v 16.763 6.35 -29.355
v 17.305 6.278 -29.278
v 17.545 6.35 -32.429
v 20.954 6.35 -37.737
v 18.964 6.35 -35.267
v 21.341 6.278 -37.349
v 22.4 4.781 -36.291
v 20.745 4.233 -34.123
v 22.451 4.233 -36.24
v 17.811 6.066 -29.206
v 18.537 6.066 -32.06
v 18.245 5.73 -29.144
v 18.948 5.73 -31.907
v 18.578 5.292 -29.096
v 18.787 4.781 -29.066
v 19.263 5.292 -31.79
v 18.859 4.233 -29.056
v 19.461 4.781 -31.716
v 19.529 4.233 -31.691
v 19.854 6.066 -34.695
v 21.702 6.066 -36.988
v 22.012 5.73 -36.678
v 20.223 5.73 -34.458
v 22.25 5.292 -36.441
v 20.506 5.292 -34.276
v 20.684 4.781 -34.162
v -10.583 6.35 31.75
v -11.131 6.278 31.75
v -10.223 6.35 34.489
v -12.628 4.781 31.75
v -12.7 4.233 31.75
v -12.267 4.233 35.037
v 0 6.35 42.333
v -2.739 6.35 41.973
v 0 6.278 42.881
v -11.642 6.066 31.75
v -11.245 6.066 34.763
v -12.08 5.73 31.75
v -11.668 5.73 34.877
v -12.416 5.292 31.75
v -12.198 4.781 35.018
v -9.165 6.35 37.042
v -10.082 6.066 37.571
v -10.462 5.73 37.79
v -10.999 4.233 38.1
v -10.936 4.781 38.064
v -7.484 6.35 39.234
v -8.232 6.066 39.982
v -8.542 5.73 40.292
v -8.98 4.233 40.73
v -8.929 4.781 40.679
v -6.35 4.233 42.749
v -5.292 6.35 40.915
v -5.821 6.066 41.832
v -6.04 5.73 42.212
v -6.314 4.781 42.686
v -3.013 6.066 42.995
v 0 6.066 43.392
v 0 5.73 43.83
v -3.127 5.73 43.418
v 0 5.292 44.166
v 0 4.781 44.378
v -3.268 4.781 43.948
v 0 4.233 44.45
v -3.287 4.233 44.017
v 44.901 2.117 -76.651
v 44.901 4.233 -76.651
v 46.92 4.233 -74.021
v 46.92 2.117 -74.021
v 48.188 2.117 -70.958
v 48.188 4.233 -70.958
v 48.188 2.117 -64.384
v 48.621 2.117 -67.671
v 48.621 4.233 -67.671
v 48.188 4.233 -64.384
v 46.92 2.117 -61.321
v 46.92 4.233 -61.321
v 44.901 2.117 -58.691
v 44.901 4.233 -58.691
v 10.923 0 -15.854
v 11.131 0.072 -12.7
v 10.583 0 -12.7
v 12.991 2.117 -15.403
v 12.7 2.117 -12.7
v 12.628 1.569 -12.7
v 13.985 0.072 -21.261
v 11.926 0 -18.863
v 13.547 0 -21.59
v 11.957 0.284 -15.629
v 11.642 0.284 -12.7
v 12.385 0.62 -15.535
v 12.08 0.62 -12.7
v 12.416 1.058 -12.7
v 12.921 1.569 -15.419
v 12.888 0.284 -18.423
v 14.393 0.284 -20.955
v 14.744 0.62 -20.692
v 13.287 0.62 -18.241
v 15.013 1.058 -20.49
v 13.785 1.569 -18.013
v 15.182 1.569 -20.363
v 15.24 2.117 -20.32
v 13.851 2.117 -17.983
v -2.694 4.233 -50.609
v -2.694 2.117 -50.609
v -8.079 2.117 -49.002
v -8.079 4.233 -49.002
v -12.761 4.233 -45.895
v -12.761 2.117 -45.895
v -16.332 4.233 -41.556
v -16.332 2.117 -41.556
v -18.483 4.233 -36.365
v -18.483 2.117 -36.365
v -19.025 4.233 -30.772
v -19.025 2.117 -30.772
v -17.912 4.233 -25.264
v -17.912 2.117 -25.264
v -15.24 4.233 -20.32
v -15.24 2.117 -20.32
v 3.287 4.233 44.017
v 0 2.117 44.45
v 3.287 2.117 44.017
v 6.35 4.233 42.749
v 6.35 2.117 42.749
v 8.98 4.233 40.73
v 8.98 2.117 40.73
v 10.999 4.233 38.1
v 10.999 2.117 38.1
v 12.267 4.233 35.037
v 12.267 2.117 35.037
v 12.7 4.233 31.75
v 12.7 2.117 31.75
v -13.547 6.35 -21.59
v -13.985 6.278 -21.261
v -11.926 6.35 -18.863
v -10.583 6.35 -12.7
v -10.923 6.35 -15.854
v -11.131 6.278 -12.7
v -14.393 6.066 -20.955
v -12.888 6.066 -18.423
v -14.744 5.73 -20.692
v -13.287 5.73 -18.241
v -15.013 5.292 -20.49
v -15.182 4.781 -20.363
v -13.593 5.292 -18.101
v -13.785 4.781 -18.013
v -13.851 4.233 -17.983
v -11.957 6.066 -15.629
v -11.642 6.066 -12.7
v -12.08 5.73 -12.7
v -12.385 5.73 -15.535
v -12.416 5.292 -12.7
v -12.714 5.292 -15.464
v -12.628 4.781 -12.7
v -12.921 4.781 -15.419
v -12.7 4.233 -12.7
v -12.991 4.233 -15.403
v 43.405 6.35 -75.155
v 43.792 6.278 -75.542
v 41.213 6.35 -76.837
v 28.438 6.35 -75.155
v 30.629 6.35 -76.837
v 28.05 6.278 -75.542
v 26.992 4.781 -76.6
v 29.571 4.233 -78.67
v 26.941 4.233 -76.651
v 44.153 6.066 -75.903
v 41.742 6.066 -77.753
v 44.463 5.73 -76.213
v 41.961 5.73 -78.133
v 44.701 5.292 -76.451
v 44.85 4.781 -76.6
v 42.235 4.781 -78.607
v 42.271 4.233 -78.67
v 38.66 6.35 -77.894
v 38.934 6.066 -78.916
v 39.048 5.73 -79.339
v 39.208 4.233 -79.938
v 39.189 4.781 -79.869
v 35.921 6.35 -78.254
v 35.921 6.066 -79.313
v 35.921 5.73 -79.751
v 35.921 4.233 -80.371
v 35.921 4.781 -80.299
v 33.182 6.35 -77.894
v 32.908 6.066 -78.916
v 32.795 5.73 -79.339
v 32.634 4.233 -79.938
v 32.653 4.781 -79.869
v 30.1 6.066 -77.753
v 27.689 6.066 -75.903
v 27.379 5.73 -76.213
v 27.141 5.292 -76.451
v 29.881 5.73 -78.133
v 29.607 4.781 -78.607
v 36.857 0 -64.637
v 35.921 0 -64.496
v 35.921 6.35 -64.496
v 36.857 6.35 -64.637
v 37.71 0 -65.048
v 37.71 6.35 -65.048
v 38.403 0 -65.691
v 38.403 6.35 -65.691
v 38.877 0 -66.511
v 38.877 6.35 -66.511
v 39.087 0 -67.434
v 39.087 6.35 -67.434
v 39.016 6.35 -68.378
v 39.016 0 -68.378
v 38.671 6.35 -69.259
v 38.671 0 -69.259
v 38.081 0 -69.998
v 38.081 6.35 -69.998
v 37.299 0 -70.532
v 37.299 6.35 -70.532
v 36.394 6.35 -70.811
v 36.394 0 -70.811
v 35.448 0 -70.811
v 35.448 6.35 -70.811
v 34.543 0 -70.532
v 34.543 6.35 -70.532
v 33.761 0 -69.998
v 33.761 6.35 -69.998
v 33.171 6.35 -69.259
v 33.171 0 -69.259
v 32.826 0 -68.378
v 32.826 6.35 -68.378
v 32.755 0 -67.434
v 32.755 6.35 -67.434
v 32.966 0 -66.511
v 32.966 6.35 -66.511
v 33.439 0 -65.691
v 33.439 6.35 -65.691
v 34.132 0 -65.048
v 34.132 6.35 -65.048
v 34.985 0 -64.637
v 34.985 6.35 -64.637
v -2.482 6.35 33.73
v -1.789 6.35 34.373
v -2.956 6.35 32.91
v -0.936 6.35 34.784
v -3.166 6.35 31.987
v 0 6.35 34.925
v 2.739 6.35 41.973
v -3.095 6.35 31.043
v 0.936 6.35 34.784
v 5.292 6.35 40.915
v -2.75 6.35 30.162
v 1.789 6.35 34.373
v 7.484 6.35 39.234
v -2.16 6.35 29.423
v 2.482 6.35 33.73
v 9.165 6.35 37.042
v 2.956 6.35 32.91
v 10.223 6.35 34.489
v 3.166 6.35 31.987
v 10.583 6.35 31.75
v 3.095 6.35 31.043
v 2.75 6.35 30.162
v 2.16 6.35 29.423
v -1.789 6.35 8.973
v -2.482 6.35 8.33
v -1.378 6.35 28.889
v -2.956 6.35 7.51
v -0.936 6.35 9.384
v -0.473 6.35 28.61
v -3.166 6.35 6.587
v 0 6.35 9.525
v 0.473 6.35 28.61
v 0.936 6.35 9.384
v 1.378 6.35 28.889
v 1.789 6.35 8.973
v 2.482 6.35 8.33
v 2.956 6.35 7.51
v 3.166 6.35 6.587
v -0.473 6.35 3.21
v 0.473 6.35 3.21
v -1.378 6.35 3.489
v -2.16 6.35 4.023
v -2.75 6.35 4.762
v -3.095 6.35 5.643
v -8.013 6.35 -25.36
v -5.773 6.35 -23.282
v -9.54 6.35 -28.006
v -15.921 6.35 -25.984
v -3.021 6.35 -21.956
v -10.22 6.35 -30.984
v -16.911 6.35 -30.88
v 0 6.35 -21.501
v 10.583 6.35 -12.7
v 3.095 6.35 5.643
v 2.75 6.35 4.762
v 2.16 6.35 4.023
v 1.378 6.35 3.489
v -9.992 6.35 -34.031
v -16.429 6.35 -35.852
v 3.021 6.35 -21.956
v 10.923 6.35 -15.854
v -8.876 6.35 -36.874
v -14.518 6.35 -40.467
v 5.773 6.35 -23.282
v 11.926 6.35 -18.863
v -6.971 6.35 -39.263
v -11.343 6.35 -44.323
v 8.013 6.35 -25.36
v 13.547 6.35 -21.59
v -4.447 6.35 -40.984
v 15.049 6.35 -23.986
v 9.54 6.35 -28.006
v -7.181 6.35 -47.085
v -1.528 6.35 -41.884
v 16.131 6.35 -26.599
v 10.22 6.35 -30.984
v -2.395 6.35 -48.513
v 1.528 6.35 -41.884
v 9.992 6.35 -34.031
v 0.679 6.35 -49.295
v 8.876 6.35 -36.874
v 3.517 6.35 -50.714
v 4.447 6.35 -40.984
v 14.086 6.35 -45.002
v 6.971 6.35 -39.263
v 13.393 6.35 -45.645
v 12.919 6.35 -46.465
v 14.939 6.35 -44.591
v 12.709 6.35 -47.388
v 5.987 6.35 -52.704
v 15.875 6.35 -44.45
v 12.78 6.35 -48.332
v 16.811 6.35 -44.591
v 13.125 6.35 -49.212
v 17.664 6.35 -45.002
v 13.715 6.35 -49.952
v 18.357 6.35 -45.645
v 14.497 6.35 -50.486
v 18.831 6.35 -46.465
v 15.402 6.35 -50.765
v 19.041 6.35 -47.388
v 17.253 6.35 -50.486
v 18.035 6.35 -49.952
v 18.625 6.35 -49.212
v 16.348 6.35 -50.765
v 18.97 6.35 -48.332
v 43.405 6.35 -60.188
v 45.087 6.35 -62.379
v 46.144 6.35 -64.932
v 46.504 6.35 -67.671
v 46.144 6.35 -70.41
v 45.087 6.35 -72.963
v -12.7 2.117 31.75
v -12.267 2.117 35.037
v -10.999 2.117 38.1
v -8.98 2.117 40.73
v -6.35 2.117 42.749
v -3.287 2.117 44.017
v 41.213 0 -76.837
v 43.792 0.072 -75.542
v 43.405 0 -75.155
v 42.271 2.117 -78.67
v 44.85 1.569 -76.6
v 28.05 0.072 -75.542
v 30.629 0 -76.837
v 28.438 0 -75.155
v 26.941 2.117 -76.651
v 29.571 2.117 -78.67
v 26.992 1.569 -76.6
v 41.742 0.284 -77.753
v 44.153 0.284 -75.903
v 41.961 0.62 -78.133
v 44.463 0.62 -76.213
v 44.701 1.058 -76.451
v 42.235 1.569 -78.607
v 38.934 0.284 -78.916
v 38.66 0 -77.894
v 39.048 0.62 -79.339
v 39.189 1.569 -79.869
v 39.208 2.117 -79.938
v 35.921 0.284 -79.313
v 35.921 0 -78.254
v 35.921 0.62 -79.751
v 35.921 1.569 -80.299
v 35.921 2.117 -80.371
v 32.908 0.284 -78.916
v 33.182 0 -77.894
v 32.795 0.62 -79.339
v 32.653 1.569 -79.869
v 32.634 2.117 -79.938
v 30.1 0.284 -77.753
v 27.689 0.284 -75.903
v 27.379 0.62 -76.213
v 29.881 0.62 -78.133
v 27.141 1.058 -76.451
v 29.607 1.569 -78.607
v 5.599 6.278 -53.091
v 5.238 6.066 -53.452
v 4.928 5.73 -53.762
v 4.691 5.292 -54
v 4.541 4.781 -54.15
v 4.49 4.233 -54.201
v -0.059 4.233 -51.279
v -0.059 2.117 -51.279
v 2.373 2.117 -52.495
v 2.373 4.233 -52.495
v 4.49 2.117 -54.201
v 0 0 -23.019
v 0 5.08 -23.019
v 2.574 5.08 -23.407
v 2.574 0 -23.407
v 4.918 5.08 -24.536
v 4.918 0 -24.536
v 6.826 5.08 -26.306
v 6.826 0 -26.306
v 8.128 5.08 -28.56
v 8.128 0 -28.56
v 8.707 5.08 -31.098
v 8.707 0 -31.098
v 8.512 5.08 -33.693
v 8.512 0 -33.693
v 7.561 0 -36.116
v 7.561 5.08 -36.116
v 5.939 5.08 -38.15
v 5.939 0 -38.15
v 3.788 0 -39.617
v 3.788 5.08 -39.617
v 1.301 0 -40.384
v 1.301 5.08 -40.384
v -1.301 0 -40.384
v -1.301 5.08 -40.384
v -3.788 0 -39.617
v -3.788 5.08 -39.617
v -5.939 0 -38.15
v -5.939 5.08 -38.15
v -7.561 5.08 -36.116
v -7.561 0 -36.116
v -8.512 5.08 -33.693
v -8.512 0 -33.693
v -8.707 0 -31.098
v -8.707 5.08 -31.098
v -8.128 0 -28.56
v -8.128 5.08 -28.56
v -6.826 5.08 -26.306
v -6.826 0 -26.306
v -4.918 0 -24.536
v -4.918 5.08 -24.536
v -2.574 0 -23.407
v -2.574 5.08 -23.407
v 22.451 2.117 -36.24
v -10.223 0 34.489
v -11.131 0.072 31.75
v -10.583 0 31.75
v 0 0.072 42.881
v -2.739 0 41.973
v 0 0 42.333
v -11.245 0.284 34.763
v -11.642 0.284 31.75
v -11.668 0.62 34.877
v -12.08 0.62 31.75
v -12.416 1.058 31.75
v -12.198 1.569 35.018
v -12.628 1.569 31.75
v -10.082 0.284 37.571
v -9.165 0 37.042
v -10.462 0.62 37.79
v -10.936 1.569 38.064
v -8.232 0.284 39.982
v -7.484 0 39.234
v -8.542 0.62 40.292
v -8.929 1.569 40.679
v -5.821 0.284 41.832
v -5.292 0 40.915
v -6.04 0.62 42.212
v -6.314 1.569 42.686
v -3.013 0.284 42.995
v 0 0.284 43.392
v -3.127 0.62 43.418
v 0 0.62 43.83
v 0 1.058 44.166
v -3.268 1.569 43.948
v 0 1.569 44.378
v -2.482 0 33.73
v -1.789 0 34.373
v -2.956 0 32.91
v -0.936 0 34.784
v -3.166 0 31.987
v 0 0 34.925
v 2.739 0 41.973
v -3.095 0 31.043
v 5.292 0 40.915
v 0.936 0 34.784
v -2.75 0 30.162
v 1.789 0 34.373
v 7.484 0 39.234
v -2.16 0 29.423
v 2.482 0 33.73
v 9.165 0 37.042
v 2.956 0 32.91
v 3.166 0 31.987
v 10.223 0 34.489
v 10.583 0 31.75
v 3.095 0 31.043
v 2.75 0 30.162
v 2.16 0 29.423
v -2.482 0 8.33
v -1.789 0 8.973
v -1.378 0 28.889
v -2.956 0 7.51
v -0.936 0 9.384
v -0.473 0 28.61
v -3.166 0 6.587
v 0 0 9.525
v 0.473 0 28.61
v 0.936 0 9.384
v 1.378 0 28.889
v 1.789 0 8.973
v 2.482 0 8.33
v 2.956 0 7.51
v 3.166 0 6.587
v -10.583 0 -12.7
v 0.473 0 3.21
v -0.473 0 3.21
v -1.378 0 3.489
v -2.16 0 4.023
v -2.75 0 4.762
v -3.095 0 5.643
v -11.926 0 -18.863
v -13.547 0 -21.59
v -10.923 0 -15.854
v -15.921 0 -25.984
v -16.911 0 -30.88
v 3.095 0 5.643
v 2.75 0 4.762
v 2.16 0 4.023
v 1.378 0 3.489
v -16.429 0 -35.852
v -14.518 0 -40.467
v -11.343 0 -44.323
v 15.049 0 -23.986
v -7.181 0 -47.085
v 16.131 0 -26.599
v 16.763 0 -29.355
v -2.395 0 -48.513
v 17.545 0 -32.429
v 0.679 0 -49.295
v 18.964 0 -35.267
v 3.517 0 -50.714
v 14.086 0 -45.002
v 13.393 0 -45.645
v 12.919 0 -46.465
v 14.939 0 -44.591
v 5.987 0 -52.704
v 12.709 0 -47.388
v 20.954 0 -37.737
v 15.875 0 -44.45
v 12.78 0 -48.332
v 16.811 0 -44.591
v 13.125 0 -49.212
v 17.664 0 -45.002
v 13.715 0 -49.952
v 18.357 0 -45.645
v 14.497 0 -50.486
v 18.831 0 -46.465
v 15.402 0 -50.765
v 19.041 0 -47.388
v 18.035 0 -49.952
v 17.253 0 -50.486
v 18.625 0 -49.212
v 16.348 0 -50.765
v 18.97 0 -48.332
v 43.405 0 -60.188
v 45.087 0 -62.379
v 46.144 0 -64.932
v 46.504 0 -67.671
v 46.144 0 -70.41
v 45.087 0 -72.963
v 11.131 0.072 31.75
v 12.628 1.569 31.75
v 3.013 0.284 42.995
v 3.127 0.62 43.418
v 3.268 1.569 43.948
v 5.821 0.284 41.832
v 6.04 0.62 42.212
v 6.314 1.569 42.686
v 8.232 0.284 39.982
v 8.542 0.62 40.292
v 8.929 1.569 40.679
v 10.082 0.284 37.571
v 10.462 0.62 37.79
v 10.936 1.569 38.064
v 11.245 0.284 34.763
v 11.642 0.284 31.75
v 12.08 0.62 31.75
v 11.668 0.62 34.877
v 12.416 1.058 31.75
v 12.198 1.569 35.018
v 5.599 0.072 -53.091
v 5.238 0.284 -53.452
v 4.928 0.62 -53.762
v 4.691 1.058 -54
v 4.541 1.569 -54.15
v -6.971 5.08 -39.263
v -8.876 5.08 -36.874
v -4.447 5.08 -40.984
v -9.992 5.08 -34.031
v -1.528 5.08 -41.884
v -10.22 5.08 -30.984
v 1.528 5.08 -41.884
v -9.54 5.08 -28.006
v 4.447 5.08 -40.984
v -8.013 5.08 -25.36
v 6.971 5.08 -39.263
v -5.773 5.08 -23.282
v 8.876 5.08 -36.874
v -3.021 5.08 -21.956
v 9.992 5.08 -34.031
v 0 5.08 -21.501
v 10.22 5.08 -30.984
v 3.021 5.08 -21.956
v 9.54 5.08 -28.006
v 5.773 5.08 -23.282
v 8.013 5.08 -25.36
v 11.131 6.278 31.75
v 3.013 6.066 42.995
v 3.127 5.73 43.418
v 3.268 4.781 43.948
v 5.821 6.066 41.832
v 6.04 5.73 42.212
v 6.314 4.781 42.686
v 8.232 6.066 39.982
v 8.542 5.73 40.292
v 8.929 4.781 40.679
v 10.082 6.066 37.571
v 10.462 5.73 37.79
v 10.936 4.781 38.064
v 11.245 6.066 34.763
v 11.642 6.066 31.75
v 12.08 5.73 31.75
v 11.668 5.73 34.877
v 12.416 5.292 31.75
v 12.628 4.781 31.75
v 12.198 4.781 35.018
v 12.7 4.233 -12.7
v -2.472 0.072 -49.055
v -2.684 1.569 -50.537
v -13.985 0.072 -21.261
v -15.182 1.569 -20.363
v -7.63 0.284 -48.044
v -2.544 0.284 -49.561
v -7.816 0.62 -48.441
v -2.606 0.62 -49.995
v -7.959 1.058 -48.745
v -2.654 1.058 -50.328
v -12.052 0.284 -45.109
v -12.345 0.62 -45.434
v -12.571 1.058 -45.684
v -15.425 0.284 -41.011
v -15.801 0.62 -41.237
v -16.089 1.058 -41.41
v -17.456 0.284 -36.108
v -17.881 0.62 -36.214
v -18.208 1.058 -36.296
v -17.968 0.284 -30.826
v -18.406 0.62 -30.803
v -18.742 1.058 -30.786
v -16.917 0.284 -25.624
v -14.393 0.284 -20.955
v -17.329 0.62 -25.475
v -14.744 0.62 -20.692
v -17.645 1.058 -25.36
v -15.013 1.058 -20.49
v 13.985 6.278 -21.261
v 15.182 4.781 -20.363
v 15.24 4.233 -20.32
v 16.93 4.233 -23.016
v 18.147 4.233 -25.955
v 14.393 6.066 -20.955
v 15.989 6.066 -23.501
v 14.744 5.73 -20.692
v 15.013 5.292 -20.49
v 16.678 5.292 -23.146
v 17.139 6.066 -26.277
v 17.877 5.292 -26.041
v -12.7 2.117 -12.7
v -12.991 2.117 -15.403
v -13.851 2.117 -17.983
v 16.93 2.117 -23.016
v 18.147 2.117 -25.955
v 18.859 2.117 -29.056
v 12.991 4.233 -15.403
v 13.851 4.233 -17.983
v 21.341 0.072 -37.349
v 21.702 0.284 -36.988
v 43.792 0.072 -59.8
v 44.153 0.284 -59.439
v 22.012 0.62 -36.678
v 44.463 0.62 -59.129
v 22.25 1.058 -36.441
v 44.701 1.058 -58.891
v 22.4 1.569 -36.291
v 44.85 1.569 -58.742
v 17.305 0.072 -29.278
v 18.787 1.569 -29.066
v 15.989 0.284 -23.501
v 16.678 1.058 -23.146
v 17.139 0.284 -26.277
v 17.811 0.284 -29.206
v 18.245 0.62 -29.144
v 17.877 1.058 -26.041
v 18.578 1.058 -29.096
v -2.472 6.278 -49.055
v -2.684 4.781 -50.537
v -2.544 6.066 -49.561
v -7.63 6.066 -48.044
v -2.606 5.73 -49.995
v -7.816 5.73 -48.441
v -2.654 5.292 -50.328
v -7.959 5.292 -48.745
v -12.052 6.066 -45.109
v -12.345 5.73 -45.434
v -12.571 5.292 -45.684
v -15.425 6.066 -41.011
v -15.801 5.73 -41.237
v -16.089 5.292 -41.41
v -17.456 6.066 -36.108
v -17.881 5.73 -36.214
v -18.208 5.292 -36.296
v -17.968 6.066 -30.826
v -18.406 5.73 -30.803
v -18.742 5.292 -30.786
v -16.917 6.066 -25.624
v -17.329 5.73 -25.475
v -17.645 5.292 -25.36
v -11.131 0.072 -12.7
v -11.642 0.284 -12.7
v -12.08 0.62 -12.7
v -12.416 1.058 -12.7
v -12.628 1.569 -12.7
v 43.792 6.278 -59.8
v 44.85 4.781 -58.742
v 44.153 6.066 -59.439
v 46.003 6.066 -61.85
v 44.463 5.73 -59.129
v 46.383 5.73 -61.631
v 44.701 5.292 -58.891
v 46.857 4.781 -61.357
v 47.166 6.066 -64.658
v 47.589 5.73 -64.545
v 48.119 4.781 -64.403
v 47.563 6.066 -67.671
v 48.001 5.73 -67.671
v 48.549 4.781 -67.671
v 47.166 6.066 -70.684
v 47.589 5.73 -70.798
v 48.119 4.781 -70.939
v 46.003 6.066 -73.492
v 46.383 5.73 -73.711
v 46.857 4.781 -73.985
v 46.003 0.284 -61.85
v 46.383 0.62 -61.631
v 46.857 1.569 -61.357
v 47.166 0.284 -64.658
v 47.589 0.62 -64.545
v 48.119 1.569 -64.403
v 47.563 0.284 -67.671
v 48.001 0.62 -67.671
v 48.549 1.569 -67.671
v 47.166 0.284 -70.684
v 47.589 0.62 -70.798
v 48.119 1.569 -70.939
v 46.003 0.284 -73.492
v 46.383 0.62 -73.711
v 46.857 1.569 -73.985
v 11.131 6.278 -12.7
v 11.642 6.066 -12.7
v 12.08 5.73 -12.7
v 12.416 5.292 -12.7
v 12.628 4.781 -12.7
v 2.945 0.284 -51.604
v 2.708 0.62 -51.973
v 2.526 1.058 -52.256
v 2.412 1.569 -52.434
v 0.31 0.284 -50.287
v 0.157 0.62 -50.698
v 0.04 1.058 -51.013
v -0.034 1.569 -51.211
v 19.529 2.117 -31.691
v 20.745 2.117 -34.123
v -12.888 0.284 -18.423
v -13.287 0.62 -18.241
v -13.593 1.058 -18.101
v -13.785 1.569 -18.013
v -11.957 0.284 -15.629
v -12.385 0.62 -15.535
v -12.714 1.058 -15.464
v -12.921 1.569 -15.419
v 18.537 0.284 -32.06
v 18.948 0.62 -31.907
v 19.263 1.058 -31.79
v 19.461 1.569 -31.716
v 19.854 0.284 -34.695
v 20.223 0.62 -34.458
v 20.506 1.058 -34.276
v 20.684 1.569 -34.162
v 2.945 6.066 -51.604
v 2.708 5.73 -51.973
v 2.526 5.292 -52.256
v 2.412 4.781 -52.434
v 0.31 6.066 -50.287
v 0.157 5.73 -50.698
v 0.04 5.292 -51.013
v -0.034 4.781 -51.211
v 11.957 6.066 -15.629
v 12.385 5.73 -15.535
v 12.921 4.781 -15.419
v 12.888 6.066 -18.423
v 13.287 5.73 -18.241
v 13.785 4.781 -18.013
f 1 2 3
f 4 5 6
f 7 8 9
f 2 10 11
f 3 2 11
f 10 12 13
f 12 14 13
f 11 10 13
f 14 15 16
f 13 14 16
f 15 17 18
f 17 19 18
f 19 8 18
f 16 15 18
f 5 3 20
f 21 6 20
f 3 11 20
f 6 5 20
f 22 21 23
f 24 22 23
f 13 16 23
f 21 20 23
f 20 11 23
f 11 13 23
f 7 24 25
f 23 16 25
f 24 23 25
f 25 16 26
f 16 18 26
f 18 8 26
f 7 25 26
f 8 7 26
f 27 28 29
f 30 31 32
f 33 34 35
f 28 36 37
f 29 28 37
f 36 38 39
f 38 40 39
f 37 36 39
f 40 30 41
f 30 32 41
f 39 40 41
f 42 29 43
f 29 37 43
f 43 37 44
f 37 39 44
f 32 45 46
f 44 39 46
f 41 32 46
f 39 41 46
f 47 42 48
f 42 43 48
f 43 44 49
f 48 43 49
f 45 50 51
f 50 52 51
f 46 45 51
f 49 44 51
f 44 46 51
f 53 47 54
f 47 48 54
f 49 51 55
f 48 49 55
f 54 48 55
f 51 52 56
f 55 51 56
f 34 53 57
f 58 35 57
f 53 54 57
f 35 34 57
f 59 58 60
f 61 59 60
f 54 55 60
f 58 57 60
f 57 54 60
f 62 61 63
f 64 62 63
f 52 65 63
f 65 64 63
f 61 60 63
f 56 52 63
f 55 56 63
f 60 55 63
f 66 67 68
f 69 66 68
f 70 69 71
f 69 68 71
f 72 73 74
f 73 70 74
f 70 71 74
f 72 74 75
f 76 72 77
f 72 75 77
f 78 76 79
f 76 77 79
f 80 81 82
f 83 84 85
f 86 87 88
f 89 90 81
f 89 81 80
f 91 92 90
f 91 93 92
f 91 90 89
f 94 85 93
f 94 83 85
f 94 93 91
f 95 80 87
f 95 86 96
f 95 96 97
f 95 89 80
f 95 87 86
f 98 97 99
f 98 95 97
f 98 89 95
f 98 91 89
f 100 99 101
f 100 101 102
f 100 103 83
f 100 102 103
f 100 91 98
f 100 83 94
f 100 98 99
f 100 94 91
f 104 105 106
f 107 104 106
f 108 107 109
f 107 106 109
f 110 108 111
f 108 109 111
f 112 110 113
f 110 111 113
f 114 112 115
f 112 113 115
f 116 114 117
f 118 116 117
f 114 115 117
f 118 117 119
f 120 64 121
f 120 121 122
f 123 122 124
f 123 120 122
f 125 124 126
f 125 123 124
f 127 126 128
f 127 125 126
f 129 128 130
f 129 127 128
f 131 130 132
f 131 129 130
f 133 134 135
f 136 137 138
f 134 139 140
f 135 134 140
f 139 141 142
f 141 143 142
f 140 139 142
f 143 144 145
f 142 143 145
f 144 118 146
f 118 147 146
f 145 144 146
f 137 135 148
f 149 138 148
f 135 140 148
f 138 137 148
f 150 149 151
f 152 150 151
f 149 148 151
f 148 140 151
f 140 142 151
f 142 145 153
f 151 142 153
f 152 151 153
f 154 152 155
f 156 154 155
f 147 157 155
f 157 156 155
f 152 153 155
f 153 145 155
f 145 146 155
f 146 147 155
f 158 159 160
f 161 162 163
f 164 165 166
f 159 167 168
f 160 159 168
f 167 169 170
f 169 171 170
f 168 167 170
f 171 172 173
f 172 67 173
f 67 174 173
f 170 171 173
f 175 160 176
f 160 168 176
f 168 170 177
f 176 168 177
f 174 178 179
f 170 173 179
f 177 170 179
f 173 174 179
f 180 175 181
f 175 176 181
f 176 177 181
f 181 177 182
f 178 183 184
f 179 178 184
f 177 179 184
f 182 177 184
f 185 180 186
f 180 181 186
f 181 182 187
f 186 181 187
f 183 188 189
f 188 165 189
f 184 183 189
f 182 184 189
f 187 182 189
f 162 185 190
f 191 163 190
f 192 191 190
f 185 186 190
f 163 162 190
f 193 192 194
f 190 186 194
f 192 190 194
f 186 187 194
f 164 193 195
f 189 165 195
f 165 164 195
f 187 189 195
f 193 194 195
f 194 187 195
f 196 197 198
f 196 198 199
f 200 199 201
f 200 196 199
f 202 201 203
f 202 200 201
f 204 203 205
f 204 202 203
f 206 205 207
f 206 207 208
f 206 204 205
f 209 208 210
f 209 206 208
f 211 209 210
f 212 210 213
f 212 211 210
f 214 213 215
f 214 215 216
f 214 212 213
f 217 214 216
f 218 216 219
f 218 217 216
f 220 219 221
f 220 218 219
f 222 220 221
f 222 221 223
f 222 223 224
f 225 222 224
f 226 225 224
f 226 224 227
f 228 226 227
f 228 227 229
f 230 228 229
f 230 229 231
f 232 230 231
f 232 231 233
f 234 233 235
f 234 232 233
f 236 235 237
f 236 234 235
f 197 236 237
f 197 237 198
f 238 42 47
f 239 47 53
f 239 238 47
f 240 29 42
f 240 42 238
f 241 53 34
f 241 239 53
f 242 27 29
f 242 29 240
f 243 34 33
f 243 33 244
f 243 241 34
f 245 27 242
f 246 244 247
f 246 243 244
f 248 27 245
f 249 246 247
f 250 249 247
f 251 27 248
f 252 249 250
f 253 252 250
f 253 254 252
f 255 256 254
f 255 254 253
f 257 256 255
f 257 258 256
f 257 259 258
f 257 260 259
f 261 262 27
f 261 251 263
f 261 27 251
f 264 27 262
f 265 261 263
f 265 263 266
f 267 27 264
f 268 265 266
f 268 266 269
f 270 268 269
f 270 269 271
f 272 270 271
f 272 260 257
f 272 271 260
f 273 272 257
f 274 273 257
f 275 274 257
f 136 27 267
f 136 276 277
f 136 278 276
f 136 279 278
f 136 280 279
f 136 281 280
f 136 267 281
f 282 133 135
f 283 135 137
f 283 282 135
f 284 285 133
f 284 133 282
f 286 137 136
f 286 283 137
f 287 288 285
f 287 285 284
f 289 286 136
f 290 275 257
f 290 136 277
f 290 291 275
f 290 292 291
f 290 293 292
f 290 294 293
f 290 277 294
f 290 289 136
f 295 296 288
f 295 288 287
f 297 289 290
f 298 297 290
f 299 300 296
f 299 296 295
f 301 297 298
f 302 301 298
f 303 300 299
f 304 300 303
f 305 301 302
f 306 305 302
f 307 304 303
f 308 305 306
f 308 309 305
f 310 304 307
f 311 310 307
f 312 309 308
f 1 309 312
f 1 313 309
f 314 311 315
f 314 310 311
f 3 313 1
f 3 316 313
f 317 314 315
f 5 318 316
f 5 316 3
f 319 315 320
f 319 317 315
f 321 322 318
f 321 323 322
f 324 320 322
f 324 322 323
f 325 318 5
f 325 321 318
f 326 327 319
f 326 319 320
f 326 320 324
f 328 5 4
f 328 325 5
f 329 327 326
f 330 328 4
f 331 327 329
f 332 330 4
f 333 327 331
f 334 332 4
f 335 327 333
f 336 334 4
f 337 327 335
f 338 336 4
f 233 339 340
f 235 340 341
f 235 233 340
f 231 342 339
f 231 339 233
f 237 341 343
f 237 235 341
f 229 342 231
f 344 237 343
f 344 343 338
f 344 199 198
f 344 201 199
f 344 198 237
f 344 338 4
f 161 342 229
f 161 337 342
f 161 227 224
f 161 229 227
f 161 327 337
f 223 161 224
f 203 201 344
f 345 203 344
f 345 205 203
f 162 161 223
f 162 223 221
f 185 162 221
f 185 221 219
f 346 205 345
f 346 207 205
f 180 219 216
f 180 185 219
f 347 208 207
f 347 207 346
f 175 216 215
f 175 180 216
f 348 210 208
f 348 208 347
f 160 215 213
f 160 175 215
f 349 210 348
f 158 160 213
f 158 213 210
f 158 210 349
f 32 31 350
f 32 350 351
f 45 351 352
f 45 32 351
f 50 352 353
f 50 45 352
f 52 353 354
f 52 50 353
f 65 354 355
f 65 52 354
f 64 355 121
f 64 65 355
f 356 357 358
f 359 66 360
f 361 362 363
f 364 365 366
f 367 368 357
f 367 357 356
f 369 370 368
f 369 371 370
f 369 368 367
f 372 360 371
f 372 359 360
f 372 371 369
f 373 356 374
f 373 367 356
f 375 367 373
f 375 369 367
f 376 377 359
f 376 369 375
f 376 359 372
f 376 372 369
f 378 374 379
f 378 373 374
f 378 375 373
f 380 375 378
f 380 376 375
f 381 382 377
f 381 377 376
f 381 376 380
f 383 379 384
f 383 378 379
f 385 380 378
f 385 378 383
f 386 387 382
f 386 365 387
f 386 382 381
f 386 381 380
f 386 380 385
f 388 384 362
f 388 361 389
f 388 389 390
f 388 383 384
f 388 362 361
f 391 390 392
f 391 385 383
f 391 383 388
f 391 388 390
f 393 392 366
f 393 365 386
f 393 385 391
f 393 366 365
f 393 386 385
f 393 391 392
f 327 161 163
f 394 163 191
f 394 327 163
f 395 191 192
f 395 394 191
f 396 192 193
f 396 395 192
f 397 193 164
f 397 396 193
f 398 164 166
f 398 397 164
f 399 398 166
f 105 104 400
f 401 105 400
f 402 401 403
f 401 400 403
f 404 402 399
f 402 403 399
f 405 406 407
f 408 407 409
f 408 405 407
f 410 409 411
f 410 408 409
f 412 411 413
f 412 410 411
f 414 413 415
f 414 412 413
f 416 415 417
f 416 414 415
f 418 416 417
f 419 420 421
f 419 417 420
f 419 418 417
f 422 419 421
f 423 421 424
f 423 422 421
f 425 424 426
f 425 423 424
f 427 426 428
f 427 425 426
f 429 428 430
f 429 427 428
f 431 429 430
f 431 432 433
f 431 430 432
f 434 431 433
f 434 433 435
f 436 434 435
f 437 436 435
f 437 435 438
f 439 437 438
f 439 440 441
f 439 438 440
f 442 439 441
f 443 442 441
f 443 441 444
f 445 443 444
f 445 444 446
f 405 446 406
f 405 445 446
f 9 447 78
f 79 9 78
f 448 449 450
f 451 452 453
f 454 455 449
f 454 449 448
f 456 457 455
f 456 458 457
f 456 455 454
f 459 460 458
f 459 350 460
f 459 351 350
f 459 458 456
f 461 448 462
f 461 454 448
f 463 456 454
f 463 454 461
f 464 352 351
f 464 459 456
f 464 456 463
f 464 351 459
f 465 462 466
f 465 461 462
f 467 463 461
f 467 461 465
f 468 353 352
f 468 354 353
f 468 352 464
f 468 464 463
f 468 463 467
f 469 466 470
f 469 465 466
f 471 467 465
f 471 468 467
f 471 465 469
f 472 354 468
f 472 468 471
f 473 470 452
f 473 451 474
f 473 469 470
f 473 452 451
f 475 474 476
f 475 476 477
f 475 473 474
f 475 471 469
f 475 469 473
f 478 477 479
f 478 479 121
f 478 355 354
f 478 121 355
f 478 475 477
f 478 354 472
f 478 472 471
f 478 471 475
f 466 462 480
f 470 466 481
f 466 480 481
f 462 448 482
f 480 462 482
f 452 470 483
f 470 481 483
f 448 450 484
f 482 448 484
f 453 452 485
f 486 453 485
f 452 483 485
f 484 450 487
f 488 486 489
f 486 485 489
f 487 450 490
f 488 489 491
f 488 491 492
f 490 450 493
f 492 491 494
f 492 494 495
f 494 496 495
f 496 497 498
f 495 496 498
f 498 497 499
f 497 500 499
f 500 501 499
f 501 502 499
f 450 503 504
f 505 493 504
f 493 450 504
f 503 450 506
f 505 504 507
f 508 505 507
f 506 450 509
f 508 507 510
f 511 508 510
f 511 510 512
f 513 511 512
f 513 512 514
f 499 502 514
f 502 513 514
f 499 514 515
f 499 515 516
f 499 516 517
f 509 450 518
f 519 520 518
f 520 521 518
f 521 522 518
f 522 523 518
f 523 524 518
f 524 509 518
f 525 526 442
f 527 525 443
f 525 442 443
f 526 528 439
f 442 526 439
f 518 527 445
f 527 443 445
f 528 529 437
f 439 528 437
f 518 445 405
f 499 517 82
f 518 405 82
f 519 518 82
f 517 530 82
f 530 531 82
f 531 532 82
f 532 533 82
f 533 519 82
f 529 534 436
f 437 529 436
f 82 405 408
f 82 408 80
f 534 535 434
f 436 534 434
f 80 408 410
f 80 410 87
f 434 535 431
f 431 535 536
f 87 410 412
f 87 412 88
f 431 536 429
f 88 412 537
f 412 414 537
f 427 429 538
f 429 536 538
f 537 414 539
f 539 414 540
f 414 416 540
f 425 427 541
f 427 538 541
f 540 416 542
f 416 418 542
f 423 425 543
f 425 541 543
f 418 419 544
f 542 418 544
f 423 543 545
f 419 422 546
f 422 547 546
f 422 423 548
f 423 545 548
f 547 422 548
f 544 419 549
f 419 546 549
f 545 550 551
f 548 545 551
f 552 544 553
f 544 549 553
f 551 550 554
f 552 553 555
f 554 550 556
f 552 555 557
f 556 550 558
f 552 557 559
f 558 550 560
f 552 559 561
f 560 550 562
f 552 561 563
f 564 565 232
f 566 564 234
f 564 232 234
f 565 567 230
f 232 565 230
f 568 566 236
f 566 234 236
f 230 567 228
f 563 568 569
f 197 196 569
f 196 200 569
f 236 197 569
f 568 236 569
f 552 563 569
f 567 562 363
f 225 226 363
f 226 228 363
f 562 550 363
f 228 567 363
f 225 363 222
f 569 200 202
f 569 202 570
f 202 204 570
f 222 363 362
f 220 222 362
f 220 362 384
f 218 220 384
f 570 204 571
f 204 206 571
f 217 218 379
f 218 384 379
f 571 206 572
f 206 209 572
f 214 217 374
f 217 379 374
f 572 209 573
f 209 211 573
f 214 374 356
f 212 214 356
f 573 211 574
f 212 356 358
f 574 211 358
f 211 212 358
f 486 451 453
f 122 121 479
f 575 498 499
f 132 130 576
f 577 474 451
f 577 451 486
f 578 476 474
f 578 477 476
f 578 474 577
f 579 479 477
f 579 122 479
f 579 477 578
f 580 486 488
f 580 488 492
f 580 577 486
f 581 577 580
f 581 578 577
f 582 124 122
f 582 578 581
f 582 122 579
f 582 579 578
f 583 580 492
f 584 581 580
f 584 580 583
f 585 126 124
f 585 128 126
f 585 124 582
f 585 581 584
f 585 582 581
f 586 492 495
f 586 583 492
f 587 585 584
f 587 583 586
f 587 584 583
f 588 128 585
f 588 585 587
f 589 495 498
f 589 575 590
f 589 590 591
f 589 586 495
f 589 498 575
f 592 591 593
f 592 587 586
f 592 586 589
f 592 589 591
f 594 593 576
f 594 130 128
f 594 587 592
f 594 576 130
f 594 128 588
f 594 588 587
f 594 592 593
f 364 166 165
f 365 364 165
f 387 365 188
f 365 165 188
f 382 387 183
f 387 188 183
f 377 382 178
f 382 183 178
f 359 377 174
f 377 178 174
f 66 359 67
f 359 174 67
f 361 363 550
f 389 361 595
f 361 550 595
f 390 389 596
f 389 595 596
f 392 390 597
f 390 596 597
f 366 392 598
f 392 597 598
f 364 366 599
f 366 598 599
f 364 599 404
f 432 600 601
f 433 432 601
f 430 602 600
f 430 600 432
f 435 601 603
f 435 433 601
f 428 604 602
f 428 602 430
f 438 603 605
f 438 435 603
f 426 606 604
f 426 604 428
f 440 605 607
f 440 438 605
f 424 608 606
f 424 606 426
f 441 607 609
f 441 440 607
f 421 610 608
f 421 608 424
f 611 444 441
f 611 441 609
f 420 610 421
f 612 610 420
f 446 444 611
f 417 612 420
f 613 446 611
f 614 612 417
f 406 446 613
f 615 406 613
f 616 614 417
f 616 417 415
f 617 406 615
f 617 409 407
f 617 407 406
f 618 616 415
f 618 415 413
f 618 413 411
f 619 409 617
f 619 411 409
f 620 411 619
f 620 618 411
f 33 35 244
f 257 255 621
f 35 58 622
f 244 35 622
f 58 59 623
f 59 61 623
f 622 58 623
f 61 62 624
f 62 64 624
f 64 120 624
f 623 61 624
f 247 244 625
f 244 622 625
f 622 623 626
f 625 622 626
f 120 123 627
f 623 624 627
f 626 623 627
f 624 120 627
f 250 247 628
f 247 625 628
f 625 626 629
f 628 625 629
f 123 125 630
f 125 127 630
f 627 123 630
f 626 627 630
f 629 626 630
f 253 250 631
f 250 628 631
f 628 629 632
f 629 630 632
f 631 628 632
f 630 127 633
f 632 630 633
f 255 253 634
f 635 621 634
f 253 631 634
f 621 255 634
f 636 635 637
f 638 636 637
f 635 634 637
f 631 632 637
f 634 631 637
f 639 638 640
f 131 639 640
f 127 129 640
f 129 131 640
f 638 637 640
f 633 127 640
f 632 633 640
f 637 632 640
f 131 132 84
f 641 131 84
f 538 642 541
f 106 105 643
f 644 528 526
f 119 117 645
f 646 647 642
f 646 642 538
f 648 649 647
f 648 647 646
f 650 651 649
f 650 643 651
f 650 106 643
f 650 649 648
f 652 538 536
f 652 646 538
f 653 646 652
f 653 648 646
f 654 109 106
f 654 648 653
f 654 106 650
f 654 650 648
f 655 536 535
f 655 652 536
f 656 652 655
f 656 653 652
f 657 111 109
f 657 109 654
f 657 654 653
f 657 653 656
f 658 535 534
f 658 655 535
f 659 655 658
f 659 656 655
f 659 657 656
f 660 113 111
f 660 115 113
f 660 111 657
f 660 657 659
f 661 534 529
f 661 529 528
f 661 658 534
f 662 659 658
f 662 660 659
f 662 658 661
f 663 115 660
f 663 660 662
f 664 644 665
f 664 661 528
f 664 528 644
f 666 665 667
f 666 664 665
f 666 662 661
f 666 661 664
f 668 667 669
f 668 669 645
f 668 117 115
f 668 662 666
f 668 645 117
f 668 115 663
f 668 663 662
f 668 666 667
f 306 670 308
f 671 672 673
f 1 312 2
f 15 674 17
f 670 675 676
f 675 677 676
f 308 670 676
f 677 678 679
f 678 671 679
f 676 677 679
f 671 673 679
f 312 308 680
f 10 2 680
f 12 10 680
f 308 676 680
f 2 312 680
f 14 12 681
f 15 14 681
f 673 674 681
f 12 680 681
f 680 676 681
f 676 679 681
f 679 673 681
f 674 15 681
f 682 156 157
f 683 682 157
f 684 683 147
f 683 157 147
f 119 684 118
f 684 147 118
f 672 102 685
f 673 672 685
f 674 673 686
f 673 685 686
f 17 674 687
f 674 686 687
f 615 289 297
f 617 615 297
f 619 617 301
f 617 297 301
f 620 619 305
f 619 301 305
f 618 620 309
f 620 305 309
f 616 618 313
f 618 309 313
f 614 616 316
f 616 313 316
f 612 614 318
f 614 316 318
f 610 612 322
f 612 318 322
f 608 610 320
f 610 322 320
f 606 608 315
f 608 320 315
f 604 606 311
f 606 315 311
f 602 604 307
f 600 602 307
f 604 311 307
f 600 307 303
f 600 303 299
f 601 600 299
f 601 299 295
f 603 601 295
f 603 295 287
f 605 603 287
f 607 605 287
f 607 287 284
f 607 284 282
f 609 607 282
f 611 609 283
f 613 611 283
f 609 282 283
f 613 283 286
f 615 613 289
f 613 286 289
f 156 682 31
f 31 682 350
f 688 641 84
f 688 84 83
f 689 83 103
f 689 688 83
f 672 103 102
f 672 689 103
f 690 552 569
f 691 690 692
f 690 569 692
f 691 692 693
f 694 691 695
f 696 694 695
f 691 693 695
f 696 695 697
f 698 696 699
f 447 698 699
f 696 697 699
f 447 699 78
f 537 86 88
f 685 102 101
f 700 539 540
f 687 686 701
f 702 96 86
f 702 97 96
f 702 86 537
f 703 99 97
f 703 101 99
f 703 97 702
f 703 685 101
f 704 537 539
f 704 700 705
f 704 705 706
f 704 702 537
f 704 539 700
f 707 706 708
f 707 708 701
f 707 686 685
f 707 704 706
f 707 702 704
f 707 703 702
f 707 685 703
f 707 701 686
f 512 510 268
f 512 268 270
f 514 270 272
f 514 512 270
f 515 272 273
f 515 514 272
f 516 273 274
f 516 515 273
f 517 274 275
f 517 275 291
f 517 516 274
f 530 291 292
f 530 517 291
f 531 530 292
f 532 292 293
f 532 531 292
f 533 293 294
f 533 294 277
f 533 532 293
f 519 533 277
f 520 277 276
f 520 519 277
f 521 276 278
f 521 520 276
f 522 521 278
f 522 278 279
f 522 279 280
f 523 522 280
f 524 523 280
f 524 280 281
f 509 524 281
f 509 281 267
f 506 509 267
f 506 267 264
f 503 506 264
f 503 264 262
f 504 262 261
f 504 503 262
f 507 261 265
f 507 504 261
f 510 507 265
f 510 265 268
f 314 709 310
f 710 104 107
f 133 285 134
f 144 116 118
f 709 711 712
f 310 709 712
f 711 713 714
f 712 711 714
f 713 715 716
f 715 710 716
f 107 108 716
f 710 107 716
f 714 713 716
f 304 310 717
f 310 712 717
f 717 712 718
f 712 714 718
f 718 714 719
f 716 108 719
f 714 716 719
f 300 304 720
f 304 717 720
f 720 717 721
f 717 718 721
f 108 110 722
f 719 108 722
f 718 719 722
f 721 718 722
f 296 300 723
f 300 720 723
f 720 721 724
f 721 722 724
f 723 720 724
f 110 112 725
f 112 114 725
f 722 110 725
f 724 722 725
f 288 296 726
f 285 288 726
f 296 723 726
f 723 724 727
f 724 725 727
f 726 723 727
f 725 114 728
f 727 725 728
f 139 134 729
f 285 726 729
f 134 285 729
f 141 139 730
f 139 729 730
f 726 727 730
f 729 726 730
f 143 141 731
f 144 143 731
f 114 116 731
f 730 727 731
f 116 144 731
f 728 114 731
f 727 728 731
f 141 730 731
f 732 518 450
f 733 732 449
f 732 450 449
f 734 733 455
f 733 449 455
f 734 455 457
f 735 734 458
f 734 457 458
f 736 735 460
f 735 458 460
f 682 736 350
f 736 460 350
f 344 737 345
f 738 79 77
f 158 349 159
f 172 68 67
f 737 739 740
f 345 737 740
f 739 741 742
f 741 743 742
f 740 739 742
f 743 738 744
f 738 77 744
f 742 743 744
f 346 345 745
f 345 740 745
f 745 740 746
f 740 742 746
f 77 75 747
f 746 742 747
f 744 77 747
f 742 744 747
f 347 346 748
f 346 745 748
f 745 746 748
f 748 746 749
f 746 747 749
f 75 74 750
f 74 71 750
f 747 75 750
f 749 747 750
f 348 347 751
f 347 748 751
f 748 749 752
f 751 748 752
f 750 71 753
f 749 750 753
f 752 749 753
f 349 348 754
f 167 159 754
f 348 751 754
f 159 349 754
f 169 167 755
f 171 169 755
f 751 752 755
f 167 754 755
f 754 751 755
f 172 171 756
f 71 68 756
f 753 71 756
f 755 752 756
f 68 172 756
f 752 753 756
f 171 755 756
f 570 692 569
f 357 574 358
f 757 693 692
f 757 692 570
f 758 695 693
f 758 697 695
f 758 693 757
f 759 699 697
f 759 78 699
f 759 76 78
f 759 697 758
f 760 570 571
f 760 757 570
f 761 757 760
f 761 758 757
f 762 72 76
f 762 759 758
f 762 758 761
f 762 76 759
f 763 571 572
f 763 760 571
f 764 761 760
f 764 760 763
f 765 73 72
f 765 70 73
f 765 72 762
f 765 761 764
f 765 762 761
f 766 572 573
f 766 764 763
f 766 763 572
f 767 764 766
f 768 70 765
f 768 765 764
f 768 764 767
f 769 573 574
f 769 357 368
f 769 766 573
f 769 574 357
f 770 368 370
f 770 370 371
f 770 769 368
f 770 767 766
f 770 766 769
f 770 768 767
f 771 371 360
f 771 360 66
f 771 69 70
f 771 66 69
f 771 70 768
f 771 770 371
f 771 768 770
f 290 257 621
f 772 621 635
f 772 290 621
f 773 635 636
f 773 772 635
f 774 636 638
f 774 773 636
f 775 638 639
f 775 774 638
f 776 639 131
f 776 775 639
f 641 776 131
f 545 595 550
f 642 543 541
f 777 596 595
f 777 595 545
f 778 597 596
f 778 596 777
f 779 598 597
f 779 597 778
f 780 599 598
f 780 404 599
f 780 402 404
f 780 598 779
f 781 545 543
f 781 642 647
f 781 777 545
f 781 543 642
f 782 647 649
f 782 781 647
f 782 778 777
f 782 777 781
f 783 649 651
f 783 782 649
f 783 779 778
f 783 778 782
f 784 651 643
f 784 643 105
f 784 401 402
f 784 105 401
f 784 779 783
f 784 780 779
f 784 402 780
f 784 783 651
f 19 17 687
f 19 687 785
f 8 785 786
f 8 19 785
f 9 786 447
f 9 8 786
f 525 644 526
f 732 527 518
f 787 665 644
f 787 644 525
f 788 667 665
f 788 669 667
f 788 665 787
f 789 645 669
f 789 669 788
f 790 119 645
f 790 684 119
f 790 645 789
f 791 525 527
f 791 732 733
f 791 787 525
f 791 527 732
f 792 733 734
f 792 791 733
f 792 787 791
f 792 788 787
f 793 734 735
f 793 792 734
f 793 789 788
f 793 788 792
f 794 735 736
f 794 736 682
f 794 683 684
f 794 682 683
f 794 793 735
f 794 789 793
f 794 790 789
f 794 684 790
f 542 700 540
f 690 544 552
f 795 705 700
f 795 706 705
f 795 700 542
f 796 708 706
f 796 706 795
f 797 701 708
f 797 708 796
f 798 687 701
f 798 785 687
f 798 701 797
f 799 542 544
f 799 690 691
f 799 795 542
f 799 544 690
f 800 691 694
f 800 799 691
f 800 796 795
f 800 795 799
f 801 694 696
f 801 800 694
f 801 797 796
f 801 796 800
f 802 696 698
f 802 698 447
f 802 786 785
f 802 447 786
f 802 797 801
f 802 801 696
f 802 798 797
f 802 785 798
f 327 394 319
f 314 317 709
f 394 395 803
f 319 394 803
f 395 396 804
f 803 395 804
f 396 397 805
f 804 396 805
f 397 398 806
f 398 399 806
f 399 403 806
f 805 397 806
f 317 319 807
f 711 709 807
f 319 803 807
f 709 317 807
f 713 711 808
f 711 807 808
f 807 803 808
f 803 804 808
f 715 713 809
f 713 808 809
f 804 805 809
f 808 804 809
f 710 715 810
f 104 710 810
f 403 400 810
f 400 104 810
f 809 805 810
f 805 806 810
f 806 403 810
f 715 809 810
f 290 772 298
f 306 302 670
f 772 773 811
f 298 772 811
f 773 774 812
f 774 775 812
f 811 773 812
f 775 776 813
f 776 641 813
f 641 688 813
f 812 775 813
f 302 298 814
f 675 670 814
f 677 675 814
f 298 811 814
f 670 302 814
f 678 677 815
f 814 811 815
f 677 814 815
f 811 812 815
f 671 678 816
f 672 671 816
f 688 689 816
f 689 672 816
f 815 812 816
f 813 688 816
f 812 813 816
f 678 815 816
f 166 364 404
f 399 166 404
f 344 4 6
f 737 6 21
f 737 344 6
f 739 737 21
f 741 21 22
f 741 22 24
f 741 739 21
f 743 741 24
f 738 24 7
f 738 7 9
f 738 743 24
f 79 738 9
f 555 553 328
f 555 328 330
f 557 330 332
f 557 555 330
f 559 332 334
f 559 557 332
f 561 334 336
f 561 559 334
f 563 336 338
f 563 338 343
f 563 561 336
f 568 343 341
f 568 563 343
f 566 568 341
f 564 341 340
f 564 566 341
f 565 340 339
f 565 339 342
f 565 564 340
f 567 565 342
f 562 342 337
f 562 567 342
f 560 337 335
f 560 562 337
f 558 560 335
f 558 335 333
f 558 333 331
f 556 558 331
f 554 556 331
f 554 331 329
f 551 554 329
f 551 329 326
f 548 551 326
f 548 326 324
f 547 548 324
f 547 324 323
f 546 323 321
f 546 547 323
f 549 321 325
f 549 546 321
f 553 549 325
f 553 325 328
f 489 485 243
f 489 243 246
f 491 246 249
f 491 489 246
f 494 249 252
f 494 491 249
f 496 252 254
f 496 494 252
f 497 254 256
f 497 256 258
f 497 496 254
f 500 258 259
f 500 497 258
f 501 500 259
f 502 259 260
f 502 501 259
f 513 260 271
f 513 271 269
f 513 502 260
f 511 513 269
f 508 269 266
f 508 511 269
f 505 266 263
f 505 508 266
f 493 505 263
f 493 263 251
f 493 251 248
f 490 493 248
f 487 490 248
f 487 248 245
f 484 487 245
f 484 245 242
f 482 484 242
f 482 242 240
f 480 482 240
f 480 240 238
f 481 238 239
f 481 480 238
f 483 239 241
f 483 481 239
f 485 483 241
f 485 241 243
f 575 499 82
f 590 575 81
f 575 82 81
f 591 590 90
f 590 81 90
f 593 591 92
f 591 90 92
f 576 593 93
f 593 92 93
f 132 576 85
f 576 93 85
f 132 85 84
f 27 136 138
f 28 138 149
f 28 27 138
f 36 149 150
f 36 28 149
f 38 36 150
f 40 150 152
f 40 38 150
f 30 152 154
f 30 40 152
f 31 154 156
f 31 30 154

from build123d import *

# Parameters (mm, degrees)
SKETCH1_R           = 3.175
SKETCH1_R_2         = 8.73125
BOSS_EXTRUDE1_DEPTH = 6.35
FILLET2_R           = 12.7
FILLET3_R           = 2.116666667
SKETCH2_R           = 10.2489
CUT_EXTRUDE1_DEPTH  = 1.27


with BuildPart() as part:
    # Sketch1 → Boss-Extrude1 (new body)
    with BuildSketch(Plane(origin=(0, 0, 0), x_dir=(1, 0, 0), z_dir=(0, 1, 0))):
        with BuildLine():
            Line((-12.7, 17.550968343), (-12.7, -44.45))
            Line((-12.7, -44.45), (12.7, -44.45))
            Line((12.7, -44.45), (12.7, 17.550968343))
            ThreePointArc((12.7, 17.550968343), (17.599905094, 24.459880613), (19.020487692, 32.80997545))
            Line((19.020487692, 32.80997545), (53.881536726, 67.671024484))
            Line((53.881536726, 67.671024484), (35.921024484, 85.631536726))
            Line((35.921024484, 85.631536726), (1.05997545, 50.770487692))
            ThreePointArc((1.05997545, 50.770487692), (-17.599905094, 39.040119387), (-12.7, 17.550968343))
        make_face()
        with Locations(Location((0, -31.75, 0), (0, 0, 270))):
            Circle(SKETCH1_R, mode=Mode.SUBTRACT)
        with Locations(Location((0, -6.35, 0), (0, 0, 270))):
            Circle(SKETCH1_R, mode=Mode.SUBTRACT)
        with Locations(Location((0, 31.75, 0), (0, 0, 270))):
            Circle(SKETCH1_R_2, mode=Mode.SUBTRACT)
        with Locations(Location((35.921024484, 67.671024484, 0), (0, 0, 270))):
            Circle(SKETCH1_R, mode=Mode.SUBTRACT)
        with Locations(Location((15.875, 47.625, 0), (0, 0, 270))):
            Circle(SKETCH1_R, mode=Mode.SUBTRACT)
    extrude(amount=BOSS_EXTRUDE1_DEPTH)

    # Fillet2
    fillet2_edges = [part.edges().sort_by_distance(p)[0] for p in [
        (35.921024484, 3.175, -85.631536726),
        (53.881536726, 3.175, -67.671024484),
        (-12.7, 3.175, 44.45),
        (12.7, 3.175, 44.45),
        (1.05997545, 3.175, -50.770487692),
        (-12.7, 3.175, -17.550968343),
        (12.7, 3.175, -17.550968343),
        (19.020487692, 3.175, -32.80997545),
    ]]
    fillet(fillet2_edges, radius=FILLET2_R - 0.0001)  # a hair under: the kernel refuses the full size

    # Fillet3
    fillet3_edges = [part.edges().sort_by_distance(p)[0] for p in [
        (17.599905094, 0, -24.459880613),
        (17.599905094, 6.35, -24.459880613),
        (12.7, 0, 9.525033333),
        (12.7, 6.35, 9.525033333),
        (33.675984024, 0, -47.465471782),
        (33.675984024, 6.35, -47.465471782),
        (-17.599905094, 0, -39.040119387),
        (-17.599905094, 6.35, -39.040119387),
        (15.715471782, 0, -65.425984024),
        (15.715471782, 6.35, -65.425984024),
        (-12.7, 0, 9.525033333),
        (-12.7, 6.35, 9.525033333),
        (8.98028541, 0, 40.73028541),
        (-8.98028541, 0, 40.73028541),
        (48.621065906, 0, -67.671024484),
        (35.921024484, 0, -80.371065906),
        (8.98028541, 6.35, 40.73028541),
        (-8.98028541, 6.35, 40.73028541),
        (48.621065906, 6.35, -67.671024484),
        (35.921024484, 6.35, -80.371065906),
        (13.351719091, 0, -16.716100664),
        (13.351719091, 6.35, -16.716100664),
        (20.071663278, 0, -32.939481059),
        (20.071663278, 6.35, -32.939481059),
        (1.189481059, 0, -51.821663278),
        (1.189481059, 6.35, -51.821663278),
        (-13.351719091, 0, -16.716100664),
        (-13.351719091, 6.35, -16.716100664),
    ]]
    fillet(fillet3_edges, radius=FILLET3_R)

    # Sketch2 → Cut-Extrude1 (cut)
    with BuildSketch(Plane(origin=(0, 6.35, 0), x_dir=(1, 0, 0), z_dir=(0, 1, 0))):
        with Locations(Location((0, 31.75, 0), (0, 0, 270))):
            Circle(SKETCH2_R)
    extrude(amount=-CUT_EXTRUDE1_DEPTH, mode=Mode.SUBTRACT)


solid = part.part
